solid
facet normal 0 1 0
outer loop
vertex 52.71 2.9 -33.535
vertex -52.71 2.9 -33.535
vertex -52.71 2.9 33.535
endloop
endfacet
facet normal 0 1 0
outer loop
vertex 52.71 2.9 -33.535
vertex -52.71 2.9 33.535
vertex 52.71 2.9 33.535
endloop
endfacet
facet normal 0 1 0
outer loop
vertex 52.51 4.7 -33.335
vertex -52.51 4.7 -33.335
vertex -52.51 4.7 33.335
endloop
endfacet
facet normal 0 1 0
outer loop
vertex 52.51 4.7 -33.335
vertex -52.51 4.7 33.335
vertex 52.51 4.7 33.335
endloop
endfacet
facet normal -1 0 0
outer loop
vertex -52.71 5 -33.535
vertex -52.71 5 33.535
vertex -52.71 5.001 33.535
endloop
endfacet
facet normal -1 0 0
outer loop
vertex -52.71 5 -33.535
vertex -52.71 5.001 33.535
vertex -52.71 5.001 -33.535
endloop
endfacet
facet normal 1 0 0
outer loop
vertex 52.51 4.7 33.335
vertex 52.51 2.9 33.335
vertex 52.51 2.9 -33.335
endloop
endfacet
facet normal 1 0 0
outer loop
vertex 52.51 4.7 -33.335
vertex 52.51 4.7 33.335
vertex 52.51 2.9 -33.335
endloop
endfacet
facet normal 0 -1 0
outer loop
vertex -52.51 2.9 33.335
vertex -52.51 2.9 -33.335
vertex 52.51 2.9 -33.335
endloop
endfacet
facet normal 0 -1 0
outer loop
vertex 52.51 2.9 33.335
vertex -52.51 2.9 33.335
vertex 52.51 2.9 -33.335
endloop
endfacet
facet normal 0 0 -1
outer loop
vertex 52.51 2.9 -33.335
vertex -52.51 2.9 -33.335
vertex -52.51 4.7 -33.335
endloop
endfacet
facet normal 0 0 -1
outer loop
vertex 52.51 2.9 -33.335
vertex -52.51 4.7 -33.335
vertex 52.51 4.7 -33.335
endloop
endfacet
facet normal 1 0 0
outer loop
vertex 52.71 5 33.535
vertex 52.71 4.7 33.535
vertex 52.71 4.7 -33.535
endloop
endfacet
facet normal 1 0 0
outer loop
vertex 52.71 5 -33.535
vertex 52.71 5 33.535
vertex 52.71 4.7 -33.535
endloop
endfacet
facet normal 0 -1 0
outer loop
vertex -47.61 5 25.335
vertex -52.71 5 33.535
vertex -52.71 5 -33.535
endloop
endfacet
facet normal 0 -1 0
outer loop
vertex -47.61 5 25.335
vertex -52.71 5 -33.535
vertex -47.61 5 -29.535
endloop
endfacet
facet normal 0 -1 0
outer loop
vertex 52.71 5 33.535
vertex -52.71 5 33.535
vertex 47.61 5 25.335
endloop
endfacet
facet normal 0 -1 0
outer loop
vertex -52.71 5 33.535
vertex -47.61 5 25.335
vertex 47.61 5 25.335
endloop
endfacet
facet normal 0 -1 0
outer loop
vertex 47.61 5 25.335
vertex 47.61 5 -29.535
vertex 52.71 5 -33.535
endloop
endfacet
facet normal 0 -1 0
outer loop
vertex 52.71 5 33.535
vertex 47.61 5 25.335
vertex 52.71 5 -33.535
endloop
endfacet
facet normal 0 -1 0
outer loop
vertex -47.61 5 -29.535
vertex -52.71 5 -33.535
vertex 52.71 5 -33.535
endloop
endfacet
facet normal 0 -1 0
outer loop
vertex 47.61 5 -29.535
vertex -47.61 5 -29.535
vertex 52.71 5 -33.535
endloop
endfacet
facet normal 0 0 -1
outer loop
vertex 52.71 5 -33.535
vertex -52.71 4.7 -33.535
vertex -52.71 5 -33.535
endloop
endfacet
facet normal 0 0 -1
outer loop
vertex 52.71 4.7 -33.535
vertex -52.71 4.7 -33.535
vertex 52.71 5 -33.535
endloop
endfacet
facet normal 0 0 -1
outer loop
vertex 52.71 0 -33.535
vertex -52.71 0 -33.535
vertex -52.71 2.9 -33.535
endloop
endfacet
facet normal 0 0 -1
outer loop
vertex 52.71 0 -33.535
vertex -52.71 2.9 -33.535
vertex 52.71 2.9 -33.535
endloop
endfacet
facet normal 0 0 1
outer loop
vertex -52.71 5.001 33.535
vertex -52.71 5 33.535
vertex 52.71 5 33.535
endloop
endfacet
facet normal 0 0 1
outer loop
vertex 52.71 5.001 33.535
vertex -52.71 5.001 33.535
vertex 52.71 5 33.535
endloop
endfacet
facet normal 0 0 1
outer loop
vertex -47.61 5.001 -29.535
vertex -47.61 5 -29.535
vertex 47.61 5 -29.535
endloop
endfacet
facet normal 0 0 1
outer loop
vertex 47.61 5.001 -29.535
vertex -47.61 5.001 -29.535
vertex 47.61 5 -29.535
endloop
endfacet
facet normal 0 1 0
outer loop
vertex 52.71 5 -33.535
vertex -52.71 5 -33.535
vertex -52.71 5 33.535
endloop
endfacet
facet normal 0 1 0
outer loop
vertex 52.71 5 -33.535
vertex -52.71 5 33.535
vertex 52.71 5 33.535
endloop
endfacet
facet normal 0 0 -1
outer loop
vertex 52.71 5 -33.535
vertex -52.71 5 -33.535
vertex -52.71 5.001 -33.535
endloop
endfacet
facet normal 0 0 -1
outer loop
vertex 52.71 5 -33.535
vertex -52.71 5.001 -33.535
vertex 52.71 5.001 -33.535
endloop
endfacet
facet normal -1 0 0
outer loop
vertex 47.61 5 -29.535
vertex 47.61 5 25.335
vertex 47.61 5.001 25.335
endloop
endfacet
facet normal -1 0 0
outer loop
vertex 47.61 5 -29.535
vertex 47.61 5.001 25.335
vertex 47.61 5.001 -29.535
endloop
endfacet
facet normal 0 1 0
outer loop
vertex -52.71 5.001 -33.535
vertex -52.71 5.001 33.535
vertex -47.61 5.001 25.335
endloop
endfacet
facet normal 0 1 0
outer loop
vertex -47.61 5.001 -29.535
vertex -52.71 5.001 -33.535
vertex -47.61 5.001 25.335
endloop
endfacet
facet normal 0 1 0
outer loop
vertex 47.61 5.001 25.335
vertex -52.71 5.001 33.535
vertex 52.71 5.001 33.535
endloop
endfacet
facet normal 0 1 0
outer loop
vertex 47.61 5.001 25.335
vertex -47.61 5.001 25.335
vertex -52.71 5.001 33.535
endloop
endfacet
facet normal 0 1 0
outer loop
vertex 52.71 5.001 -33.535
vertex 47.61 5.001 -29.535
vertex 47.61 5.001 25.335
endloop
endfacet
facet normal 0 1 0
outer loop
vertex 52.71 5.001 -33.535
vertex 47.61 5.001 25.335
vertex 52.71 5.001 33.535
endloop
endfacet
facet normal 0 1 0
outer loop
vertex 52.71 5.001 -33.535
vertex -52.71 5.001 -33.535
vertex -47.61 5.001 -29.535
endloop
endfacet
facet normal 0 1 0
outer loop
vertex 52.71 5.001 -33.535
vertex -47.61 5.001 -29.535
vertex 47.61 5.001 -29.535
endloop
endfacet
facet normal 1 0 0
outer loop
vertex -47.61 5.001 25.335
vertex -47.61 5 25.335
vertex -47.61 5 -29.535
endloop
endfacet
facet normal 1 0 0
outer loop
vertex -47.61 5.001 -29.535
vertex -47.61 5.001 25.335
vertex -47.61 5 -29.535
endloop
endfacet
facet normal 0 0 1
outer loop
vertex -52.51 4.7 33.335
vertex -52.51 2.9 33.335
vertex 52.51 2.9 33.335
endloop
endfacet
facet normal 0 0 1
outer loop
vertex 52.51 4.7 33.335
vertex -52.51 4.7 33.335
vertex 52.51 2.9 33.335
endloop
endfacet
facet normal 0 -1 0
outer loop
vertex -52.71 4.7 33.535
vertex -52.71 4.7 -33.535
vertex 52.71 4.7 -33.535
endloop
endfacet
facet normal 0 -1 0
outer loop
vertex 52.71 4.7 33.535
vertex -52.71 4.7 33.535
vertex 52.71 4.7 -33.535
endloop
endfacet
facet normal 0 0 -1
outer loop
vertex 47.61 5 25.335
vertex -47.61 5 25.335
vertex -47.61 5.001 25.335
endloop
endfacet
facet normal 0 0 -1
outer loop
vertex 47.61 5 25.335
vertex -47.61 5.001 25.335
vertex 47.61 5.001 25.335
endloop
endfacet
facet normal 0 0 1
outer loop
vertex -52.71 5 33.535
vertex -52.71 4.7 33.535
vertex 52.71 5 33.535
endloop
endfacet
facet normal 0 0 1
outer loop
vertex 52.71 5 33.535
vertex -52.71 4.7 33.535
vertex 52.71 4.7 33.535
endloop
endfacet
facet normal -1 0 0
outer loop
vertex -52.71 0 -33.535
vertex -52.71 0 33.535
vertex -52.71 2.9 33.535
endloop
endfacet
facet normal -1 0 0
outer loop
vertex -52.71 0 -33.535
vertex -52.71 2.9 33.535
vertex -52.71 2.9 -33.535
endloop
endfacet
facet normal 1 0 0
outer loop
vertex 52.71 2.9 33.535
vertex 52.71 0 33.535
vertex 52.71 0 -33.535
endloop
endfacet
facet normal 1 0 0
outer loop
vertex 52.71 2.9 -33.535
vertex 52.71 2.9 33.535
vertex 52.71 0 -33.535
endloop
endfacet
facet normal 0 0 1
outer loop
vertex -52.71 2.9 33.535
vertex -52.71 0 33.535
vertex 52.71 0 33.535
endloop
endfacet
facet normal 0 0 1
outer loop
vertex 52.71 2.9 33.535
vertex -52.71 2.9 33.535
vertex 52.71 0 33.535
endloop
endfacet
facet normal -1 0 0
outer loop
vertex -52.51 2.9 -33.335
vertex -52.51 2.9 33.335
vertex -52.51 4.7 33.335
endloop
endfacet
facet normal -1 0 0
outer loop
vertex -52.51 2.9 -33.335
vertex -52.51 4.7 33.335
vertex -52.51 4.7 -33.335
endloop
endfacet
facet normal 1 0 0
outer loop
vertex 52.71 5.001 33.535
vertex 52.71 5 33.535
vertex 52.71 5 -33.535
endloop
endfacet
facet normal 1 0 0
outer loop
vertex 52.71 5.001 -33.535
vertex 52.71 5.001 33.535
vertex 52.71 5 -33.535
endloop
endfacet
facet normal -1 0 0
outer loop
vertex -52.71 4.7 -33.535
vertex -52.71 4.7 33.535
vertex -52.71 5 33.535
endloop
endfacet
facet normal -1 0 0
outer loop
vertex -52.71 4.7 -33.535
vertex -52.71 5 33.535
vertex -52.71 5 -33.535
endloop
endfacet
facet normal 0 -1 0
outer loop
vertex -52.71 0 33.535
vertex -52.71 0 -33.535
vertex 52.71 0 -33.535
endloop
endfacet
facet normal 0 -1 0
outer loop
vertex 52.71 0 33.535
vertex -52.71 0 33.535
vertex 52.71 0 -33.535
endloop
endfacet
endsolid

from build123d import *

# Parameters (mm, degrees)
SKETCH1_W           = 105.42
SKETCH1_H           = 67.07
BOSS_EXTRUDE1_DEPTH = 2.9
SKETCH2_W           = 105.02
SKETCH2_H           = 66.67
BOSS_EXTRUDE2_DEPTH = 1.8
SKETCH3_W           = 105.42
SKETCH3_H           = 67.07
BOSS_EXTRUDE3_DEPTH = 0.3
SKETCH4_W           = 105.42
SKETCH4_H           = 67.07
SKETCH4_W_2         = 95.22
SKETCH4_H_2         = 54.87
BOSS_EXTRUDE4_DEPTH = 0.001


with BuildPart() as part:
    # Sketch1 → Boss-Extrude1 (new body)
    with BuildSketch(Plane(origin=(0, 0, 0), x_dir=(1, 0, 0), z_dir=(0, 1, 0))):
        Rectangle(SKETCH1_W, SKETCH1_H)
    extrude(amount=BOSS_EXTRUDE1_DEPTH)


with BuildPart() as body_2:
    # Sketch2 → Boss-Extrude2 (new body)
    with BuildSketch(Plane(origin=(0, 2.9, 0), x_dir=(1, 0, 0), z_dir=(0, 1, 0))):
        Rectangle(SKETCH2_W, SKETCH2_H)
    extrude(amount=BOSS_EXTRUDE2_DEPTH)


with BuildPart() as body_3:
    # Sketch3 → Boss-Extrude3 (new body)
    with BuildSketch(Plane(origin=(0, 4.7, 0), x_dir=(1, 0, 0), z_dir=(0, 1, 0))):
        Rectangle(SKETCH3_W, SKETCH3_H)
    extrude(amount=BOSS_EXTRUDE3_DEPTH)


with BuildPart() as body_4:
    # Sketch4 → Boss-Extrude4 (new body)
    with BuildSketch(Plane(origin=(0, 5, 0), x_dir=(1, 0, 0), z_dir=(0, 1, 0))):
        Rectangle(SKETCH4_W, SKETCH4_H)
        with Locations((0, 2.1)):
            Rectangle(SKETCH4_W_2, SKETCH4_H_2, mode=Mode.SUBTRACT)
    extrude(amount=BOSS_EXTRUDE4_DEPTH)


solid = Compound([part.part, body_2.part, body_3.part, body_4.part])
